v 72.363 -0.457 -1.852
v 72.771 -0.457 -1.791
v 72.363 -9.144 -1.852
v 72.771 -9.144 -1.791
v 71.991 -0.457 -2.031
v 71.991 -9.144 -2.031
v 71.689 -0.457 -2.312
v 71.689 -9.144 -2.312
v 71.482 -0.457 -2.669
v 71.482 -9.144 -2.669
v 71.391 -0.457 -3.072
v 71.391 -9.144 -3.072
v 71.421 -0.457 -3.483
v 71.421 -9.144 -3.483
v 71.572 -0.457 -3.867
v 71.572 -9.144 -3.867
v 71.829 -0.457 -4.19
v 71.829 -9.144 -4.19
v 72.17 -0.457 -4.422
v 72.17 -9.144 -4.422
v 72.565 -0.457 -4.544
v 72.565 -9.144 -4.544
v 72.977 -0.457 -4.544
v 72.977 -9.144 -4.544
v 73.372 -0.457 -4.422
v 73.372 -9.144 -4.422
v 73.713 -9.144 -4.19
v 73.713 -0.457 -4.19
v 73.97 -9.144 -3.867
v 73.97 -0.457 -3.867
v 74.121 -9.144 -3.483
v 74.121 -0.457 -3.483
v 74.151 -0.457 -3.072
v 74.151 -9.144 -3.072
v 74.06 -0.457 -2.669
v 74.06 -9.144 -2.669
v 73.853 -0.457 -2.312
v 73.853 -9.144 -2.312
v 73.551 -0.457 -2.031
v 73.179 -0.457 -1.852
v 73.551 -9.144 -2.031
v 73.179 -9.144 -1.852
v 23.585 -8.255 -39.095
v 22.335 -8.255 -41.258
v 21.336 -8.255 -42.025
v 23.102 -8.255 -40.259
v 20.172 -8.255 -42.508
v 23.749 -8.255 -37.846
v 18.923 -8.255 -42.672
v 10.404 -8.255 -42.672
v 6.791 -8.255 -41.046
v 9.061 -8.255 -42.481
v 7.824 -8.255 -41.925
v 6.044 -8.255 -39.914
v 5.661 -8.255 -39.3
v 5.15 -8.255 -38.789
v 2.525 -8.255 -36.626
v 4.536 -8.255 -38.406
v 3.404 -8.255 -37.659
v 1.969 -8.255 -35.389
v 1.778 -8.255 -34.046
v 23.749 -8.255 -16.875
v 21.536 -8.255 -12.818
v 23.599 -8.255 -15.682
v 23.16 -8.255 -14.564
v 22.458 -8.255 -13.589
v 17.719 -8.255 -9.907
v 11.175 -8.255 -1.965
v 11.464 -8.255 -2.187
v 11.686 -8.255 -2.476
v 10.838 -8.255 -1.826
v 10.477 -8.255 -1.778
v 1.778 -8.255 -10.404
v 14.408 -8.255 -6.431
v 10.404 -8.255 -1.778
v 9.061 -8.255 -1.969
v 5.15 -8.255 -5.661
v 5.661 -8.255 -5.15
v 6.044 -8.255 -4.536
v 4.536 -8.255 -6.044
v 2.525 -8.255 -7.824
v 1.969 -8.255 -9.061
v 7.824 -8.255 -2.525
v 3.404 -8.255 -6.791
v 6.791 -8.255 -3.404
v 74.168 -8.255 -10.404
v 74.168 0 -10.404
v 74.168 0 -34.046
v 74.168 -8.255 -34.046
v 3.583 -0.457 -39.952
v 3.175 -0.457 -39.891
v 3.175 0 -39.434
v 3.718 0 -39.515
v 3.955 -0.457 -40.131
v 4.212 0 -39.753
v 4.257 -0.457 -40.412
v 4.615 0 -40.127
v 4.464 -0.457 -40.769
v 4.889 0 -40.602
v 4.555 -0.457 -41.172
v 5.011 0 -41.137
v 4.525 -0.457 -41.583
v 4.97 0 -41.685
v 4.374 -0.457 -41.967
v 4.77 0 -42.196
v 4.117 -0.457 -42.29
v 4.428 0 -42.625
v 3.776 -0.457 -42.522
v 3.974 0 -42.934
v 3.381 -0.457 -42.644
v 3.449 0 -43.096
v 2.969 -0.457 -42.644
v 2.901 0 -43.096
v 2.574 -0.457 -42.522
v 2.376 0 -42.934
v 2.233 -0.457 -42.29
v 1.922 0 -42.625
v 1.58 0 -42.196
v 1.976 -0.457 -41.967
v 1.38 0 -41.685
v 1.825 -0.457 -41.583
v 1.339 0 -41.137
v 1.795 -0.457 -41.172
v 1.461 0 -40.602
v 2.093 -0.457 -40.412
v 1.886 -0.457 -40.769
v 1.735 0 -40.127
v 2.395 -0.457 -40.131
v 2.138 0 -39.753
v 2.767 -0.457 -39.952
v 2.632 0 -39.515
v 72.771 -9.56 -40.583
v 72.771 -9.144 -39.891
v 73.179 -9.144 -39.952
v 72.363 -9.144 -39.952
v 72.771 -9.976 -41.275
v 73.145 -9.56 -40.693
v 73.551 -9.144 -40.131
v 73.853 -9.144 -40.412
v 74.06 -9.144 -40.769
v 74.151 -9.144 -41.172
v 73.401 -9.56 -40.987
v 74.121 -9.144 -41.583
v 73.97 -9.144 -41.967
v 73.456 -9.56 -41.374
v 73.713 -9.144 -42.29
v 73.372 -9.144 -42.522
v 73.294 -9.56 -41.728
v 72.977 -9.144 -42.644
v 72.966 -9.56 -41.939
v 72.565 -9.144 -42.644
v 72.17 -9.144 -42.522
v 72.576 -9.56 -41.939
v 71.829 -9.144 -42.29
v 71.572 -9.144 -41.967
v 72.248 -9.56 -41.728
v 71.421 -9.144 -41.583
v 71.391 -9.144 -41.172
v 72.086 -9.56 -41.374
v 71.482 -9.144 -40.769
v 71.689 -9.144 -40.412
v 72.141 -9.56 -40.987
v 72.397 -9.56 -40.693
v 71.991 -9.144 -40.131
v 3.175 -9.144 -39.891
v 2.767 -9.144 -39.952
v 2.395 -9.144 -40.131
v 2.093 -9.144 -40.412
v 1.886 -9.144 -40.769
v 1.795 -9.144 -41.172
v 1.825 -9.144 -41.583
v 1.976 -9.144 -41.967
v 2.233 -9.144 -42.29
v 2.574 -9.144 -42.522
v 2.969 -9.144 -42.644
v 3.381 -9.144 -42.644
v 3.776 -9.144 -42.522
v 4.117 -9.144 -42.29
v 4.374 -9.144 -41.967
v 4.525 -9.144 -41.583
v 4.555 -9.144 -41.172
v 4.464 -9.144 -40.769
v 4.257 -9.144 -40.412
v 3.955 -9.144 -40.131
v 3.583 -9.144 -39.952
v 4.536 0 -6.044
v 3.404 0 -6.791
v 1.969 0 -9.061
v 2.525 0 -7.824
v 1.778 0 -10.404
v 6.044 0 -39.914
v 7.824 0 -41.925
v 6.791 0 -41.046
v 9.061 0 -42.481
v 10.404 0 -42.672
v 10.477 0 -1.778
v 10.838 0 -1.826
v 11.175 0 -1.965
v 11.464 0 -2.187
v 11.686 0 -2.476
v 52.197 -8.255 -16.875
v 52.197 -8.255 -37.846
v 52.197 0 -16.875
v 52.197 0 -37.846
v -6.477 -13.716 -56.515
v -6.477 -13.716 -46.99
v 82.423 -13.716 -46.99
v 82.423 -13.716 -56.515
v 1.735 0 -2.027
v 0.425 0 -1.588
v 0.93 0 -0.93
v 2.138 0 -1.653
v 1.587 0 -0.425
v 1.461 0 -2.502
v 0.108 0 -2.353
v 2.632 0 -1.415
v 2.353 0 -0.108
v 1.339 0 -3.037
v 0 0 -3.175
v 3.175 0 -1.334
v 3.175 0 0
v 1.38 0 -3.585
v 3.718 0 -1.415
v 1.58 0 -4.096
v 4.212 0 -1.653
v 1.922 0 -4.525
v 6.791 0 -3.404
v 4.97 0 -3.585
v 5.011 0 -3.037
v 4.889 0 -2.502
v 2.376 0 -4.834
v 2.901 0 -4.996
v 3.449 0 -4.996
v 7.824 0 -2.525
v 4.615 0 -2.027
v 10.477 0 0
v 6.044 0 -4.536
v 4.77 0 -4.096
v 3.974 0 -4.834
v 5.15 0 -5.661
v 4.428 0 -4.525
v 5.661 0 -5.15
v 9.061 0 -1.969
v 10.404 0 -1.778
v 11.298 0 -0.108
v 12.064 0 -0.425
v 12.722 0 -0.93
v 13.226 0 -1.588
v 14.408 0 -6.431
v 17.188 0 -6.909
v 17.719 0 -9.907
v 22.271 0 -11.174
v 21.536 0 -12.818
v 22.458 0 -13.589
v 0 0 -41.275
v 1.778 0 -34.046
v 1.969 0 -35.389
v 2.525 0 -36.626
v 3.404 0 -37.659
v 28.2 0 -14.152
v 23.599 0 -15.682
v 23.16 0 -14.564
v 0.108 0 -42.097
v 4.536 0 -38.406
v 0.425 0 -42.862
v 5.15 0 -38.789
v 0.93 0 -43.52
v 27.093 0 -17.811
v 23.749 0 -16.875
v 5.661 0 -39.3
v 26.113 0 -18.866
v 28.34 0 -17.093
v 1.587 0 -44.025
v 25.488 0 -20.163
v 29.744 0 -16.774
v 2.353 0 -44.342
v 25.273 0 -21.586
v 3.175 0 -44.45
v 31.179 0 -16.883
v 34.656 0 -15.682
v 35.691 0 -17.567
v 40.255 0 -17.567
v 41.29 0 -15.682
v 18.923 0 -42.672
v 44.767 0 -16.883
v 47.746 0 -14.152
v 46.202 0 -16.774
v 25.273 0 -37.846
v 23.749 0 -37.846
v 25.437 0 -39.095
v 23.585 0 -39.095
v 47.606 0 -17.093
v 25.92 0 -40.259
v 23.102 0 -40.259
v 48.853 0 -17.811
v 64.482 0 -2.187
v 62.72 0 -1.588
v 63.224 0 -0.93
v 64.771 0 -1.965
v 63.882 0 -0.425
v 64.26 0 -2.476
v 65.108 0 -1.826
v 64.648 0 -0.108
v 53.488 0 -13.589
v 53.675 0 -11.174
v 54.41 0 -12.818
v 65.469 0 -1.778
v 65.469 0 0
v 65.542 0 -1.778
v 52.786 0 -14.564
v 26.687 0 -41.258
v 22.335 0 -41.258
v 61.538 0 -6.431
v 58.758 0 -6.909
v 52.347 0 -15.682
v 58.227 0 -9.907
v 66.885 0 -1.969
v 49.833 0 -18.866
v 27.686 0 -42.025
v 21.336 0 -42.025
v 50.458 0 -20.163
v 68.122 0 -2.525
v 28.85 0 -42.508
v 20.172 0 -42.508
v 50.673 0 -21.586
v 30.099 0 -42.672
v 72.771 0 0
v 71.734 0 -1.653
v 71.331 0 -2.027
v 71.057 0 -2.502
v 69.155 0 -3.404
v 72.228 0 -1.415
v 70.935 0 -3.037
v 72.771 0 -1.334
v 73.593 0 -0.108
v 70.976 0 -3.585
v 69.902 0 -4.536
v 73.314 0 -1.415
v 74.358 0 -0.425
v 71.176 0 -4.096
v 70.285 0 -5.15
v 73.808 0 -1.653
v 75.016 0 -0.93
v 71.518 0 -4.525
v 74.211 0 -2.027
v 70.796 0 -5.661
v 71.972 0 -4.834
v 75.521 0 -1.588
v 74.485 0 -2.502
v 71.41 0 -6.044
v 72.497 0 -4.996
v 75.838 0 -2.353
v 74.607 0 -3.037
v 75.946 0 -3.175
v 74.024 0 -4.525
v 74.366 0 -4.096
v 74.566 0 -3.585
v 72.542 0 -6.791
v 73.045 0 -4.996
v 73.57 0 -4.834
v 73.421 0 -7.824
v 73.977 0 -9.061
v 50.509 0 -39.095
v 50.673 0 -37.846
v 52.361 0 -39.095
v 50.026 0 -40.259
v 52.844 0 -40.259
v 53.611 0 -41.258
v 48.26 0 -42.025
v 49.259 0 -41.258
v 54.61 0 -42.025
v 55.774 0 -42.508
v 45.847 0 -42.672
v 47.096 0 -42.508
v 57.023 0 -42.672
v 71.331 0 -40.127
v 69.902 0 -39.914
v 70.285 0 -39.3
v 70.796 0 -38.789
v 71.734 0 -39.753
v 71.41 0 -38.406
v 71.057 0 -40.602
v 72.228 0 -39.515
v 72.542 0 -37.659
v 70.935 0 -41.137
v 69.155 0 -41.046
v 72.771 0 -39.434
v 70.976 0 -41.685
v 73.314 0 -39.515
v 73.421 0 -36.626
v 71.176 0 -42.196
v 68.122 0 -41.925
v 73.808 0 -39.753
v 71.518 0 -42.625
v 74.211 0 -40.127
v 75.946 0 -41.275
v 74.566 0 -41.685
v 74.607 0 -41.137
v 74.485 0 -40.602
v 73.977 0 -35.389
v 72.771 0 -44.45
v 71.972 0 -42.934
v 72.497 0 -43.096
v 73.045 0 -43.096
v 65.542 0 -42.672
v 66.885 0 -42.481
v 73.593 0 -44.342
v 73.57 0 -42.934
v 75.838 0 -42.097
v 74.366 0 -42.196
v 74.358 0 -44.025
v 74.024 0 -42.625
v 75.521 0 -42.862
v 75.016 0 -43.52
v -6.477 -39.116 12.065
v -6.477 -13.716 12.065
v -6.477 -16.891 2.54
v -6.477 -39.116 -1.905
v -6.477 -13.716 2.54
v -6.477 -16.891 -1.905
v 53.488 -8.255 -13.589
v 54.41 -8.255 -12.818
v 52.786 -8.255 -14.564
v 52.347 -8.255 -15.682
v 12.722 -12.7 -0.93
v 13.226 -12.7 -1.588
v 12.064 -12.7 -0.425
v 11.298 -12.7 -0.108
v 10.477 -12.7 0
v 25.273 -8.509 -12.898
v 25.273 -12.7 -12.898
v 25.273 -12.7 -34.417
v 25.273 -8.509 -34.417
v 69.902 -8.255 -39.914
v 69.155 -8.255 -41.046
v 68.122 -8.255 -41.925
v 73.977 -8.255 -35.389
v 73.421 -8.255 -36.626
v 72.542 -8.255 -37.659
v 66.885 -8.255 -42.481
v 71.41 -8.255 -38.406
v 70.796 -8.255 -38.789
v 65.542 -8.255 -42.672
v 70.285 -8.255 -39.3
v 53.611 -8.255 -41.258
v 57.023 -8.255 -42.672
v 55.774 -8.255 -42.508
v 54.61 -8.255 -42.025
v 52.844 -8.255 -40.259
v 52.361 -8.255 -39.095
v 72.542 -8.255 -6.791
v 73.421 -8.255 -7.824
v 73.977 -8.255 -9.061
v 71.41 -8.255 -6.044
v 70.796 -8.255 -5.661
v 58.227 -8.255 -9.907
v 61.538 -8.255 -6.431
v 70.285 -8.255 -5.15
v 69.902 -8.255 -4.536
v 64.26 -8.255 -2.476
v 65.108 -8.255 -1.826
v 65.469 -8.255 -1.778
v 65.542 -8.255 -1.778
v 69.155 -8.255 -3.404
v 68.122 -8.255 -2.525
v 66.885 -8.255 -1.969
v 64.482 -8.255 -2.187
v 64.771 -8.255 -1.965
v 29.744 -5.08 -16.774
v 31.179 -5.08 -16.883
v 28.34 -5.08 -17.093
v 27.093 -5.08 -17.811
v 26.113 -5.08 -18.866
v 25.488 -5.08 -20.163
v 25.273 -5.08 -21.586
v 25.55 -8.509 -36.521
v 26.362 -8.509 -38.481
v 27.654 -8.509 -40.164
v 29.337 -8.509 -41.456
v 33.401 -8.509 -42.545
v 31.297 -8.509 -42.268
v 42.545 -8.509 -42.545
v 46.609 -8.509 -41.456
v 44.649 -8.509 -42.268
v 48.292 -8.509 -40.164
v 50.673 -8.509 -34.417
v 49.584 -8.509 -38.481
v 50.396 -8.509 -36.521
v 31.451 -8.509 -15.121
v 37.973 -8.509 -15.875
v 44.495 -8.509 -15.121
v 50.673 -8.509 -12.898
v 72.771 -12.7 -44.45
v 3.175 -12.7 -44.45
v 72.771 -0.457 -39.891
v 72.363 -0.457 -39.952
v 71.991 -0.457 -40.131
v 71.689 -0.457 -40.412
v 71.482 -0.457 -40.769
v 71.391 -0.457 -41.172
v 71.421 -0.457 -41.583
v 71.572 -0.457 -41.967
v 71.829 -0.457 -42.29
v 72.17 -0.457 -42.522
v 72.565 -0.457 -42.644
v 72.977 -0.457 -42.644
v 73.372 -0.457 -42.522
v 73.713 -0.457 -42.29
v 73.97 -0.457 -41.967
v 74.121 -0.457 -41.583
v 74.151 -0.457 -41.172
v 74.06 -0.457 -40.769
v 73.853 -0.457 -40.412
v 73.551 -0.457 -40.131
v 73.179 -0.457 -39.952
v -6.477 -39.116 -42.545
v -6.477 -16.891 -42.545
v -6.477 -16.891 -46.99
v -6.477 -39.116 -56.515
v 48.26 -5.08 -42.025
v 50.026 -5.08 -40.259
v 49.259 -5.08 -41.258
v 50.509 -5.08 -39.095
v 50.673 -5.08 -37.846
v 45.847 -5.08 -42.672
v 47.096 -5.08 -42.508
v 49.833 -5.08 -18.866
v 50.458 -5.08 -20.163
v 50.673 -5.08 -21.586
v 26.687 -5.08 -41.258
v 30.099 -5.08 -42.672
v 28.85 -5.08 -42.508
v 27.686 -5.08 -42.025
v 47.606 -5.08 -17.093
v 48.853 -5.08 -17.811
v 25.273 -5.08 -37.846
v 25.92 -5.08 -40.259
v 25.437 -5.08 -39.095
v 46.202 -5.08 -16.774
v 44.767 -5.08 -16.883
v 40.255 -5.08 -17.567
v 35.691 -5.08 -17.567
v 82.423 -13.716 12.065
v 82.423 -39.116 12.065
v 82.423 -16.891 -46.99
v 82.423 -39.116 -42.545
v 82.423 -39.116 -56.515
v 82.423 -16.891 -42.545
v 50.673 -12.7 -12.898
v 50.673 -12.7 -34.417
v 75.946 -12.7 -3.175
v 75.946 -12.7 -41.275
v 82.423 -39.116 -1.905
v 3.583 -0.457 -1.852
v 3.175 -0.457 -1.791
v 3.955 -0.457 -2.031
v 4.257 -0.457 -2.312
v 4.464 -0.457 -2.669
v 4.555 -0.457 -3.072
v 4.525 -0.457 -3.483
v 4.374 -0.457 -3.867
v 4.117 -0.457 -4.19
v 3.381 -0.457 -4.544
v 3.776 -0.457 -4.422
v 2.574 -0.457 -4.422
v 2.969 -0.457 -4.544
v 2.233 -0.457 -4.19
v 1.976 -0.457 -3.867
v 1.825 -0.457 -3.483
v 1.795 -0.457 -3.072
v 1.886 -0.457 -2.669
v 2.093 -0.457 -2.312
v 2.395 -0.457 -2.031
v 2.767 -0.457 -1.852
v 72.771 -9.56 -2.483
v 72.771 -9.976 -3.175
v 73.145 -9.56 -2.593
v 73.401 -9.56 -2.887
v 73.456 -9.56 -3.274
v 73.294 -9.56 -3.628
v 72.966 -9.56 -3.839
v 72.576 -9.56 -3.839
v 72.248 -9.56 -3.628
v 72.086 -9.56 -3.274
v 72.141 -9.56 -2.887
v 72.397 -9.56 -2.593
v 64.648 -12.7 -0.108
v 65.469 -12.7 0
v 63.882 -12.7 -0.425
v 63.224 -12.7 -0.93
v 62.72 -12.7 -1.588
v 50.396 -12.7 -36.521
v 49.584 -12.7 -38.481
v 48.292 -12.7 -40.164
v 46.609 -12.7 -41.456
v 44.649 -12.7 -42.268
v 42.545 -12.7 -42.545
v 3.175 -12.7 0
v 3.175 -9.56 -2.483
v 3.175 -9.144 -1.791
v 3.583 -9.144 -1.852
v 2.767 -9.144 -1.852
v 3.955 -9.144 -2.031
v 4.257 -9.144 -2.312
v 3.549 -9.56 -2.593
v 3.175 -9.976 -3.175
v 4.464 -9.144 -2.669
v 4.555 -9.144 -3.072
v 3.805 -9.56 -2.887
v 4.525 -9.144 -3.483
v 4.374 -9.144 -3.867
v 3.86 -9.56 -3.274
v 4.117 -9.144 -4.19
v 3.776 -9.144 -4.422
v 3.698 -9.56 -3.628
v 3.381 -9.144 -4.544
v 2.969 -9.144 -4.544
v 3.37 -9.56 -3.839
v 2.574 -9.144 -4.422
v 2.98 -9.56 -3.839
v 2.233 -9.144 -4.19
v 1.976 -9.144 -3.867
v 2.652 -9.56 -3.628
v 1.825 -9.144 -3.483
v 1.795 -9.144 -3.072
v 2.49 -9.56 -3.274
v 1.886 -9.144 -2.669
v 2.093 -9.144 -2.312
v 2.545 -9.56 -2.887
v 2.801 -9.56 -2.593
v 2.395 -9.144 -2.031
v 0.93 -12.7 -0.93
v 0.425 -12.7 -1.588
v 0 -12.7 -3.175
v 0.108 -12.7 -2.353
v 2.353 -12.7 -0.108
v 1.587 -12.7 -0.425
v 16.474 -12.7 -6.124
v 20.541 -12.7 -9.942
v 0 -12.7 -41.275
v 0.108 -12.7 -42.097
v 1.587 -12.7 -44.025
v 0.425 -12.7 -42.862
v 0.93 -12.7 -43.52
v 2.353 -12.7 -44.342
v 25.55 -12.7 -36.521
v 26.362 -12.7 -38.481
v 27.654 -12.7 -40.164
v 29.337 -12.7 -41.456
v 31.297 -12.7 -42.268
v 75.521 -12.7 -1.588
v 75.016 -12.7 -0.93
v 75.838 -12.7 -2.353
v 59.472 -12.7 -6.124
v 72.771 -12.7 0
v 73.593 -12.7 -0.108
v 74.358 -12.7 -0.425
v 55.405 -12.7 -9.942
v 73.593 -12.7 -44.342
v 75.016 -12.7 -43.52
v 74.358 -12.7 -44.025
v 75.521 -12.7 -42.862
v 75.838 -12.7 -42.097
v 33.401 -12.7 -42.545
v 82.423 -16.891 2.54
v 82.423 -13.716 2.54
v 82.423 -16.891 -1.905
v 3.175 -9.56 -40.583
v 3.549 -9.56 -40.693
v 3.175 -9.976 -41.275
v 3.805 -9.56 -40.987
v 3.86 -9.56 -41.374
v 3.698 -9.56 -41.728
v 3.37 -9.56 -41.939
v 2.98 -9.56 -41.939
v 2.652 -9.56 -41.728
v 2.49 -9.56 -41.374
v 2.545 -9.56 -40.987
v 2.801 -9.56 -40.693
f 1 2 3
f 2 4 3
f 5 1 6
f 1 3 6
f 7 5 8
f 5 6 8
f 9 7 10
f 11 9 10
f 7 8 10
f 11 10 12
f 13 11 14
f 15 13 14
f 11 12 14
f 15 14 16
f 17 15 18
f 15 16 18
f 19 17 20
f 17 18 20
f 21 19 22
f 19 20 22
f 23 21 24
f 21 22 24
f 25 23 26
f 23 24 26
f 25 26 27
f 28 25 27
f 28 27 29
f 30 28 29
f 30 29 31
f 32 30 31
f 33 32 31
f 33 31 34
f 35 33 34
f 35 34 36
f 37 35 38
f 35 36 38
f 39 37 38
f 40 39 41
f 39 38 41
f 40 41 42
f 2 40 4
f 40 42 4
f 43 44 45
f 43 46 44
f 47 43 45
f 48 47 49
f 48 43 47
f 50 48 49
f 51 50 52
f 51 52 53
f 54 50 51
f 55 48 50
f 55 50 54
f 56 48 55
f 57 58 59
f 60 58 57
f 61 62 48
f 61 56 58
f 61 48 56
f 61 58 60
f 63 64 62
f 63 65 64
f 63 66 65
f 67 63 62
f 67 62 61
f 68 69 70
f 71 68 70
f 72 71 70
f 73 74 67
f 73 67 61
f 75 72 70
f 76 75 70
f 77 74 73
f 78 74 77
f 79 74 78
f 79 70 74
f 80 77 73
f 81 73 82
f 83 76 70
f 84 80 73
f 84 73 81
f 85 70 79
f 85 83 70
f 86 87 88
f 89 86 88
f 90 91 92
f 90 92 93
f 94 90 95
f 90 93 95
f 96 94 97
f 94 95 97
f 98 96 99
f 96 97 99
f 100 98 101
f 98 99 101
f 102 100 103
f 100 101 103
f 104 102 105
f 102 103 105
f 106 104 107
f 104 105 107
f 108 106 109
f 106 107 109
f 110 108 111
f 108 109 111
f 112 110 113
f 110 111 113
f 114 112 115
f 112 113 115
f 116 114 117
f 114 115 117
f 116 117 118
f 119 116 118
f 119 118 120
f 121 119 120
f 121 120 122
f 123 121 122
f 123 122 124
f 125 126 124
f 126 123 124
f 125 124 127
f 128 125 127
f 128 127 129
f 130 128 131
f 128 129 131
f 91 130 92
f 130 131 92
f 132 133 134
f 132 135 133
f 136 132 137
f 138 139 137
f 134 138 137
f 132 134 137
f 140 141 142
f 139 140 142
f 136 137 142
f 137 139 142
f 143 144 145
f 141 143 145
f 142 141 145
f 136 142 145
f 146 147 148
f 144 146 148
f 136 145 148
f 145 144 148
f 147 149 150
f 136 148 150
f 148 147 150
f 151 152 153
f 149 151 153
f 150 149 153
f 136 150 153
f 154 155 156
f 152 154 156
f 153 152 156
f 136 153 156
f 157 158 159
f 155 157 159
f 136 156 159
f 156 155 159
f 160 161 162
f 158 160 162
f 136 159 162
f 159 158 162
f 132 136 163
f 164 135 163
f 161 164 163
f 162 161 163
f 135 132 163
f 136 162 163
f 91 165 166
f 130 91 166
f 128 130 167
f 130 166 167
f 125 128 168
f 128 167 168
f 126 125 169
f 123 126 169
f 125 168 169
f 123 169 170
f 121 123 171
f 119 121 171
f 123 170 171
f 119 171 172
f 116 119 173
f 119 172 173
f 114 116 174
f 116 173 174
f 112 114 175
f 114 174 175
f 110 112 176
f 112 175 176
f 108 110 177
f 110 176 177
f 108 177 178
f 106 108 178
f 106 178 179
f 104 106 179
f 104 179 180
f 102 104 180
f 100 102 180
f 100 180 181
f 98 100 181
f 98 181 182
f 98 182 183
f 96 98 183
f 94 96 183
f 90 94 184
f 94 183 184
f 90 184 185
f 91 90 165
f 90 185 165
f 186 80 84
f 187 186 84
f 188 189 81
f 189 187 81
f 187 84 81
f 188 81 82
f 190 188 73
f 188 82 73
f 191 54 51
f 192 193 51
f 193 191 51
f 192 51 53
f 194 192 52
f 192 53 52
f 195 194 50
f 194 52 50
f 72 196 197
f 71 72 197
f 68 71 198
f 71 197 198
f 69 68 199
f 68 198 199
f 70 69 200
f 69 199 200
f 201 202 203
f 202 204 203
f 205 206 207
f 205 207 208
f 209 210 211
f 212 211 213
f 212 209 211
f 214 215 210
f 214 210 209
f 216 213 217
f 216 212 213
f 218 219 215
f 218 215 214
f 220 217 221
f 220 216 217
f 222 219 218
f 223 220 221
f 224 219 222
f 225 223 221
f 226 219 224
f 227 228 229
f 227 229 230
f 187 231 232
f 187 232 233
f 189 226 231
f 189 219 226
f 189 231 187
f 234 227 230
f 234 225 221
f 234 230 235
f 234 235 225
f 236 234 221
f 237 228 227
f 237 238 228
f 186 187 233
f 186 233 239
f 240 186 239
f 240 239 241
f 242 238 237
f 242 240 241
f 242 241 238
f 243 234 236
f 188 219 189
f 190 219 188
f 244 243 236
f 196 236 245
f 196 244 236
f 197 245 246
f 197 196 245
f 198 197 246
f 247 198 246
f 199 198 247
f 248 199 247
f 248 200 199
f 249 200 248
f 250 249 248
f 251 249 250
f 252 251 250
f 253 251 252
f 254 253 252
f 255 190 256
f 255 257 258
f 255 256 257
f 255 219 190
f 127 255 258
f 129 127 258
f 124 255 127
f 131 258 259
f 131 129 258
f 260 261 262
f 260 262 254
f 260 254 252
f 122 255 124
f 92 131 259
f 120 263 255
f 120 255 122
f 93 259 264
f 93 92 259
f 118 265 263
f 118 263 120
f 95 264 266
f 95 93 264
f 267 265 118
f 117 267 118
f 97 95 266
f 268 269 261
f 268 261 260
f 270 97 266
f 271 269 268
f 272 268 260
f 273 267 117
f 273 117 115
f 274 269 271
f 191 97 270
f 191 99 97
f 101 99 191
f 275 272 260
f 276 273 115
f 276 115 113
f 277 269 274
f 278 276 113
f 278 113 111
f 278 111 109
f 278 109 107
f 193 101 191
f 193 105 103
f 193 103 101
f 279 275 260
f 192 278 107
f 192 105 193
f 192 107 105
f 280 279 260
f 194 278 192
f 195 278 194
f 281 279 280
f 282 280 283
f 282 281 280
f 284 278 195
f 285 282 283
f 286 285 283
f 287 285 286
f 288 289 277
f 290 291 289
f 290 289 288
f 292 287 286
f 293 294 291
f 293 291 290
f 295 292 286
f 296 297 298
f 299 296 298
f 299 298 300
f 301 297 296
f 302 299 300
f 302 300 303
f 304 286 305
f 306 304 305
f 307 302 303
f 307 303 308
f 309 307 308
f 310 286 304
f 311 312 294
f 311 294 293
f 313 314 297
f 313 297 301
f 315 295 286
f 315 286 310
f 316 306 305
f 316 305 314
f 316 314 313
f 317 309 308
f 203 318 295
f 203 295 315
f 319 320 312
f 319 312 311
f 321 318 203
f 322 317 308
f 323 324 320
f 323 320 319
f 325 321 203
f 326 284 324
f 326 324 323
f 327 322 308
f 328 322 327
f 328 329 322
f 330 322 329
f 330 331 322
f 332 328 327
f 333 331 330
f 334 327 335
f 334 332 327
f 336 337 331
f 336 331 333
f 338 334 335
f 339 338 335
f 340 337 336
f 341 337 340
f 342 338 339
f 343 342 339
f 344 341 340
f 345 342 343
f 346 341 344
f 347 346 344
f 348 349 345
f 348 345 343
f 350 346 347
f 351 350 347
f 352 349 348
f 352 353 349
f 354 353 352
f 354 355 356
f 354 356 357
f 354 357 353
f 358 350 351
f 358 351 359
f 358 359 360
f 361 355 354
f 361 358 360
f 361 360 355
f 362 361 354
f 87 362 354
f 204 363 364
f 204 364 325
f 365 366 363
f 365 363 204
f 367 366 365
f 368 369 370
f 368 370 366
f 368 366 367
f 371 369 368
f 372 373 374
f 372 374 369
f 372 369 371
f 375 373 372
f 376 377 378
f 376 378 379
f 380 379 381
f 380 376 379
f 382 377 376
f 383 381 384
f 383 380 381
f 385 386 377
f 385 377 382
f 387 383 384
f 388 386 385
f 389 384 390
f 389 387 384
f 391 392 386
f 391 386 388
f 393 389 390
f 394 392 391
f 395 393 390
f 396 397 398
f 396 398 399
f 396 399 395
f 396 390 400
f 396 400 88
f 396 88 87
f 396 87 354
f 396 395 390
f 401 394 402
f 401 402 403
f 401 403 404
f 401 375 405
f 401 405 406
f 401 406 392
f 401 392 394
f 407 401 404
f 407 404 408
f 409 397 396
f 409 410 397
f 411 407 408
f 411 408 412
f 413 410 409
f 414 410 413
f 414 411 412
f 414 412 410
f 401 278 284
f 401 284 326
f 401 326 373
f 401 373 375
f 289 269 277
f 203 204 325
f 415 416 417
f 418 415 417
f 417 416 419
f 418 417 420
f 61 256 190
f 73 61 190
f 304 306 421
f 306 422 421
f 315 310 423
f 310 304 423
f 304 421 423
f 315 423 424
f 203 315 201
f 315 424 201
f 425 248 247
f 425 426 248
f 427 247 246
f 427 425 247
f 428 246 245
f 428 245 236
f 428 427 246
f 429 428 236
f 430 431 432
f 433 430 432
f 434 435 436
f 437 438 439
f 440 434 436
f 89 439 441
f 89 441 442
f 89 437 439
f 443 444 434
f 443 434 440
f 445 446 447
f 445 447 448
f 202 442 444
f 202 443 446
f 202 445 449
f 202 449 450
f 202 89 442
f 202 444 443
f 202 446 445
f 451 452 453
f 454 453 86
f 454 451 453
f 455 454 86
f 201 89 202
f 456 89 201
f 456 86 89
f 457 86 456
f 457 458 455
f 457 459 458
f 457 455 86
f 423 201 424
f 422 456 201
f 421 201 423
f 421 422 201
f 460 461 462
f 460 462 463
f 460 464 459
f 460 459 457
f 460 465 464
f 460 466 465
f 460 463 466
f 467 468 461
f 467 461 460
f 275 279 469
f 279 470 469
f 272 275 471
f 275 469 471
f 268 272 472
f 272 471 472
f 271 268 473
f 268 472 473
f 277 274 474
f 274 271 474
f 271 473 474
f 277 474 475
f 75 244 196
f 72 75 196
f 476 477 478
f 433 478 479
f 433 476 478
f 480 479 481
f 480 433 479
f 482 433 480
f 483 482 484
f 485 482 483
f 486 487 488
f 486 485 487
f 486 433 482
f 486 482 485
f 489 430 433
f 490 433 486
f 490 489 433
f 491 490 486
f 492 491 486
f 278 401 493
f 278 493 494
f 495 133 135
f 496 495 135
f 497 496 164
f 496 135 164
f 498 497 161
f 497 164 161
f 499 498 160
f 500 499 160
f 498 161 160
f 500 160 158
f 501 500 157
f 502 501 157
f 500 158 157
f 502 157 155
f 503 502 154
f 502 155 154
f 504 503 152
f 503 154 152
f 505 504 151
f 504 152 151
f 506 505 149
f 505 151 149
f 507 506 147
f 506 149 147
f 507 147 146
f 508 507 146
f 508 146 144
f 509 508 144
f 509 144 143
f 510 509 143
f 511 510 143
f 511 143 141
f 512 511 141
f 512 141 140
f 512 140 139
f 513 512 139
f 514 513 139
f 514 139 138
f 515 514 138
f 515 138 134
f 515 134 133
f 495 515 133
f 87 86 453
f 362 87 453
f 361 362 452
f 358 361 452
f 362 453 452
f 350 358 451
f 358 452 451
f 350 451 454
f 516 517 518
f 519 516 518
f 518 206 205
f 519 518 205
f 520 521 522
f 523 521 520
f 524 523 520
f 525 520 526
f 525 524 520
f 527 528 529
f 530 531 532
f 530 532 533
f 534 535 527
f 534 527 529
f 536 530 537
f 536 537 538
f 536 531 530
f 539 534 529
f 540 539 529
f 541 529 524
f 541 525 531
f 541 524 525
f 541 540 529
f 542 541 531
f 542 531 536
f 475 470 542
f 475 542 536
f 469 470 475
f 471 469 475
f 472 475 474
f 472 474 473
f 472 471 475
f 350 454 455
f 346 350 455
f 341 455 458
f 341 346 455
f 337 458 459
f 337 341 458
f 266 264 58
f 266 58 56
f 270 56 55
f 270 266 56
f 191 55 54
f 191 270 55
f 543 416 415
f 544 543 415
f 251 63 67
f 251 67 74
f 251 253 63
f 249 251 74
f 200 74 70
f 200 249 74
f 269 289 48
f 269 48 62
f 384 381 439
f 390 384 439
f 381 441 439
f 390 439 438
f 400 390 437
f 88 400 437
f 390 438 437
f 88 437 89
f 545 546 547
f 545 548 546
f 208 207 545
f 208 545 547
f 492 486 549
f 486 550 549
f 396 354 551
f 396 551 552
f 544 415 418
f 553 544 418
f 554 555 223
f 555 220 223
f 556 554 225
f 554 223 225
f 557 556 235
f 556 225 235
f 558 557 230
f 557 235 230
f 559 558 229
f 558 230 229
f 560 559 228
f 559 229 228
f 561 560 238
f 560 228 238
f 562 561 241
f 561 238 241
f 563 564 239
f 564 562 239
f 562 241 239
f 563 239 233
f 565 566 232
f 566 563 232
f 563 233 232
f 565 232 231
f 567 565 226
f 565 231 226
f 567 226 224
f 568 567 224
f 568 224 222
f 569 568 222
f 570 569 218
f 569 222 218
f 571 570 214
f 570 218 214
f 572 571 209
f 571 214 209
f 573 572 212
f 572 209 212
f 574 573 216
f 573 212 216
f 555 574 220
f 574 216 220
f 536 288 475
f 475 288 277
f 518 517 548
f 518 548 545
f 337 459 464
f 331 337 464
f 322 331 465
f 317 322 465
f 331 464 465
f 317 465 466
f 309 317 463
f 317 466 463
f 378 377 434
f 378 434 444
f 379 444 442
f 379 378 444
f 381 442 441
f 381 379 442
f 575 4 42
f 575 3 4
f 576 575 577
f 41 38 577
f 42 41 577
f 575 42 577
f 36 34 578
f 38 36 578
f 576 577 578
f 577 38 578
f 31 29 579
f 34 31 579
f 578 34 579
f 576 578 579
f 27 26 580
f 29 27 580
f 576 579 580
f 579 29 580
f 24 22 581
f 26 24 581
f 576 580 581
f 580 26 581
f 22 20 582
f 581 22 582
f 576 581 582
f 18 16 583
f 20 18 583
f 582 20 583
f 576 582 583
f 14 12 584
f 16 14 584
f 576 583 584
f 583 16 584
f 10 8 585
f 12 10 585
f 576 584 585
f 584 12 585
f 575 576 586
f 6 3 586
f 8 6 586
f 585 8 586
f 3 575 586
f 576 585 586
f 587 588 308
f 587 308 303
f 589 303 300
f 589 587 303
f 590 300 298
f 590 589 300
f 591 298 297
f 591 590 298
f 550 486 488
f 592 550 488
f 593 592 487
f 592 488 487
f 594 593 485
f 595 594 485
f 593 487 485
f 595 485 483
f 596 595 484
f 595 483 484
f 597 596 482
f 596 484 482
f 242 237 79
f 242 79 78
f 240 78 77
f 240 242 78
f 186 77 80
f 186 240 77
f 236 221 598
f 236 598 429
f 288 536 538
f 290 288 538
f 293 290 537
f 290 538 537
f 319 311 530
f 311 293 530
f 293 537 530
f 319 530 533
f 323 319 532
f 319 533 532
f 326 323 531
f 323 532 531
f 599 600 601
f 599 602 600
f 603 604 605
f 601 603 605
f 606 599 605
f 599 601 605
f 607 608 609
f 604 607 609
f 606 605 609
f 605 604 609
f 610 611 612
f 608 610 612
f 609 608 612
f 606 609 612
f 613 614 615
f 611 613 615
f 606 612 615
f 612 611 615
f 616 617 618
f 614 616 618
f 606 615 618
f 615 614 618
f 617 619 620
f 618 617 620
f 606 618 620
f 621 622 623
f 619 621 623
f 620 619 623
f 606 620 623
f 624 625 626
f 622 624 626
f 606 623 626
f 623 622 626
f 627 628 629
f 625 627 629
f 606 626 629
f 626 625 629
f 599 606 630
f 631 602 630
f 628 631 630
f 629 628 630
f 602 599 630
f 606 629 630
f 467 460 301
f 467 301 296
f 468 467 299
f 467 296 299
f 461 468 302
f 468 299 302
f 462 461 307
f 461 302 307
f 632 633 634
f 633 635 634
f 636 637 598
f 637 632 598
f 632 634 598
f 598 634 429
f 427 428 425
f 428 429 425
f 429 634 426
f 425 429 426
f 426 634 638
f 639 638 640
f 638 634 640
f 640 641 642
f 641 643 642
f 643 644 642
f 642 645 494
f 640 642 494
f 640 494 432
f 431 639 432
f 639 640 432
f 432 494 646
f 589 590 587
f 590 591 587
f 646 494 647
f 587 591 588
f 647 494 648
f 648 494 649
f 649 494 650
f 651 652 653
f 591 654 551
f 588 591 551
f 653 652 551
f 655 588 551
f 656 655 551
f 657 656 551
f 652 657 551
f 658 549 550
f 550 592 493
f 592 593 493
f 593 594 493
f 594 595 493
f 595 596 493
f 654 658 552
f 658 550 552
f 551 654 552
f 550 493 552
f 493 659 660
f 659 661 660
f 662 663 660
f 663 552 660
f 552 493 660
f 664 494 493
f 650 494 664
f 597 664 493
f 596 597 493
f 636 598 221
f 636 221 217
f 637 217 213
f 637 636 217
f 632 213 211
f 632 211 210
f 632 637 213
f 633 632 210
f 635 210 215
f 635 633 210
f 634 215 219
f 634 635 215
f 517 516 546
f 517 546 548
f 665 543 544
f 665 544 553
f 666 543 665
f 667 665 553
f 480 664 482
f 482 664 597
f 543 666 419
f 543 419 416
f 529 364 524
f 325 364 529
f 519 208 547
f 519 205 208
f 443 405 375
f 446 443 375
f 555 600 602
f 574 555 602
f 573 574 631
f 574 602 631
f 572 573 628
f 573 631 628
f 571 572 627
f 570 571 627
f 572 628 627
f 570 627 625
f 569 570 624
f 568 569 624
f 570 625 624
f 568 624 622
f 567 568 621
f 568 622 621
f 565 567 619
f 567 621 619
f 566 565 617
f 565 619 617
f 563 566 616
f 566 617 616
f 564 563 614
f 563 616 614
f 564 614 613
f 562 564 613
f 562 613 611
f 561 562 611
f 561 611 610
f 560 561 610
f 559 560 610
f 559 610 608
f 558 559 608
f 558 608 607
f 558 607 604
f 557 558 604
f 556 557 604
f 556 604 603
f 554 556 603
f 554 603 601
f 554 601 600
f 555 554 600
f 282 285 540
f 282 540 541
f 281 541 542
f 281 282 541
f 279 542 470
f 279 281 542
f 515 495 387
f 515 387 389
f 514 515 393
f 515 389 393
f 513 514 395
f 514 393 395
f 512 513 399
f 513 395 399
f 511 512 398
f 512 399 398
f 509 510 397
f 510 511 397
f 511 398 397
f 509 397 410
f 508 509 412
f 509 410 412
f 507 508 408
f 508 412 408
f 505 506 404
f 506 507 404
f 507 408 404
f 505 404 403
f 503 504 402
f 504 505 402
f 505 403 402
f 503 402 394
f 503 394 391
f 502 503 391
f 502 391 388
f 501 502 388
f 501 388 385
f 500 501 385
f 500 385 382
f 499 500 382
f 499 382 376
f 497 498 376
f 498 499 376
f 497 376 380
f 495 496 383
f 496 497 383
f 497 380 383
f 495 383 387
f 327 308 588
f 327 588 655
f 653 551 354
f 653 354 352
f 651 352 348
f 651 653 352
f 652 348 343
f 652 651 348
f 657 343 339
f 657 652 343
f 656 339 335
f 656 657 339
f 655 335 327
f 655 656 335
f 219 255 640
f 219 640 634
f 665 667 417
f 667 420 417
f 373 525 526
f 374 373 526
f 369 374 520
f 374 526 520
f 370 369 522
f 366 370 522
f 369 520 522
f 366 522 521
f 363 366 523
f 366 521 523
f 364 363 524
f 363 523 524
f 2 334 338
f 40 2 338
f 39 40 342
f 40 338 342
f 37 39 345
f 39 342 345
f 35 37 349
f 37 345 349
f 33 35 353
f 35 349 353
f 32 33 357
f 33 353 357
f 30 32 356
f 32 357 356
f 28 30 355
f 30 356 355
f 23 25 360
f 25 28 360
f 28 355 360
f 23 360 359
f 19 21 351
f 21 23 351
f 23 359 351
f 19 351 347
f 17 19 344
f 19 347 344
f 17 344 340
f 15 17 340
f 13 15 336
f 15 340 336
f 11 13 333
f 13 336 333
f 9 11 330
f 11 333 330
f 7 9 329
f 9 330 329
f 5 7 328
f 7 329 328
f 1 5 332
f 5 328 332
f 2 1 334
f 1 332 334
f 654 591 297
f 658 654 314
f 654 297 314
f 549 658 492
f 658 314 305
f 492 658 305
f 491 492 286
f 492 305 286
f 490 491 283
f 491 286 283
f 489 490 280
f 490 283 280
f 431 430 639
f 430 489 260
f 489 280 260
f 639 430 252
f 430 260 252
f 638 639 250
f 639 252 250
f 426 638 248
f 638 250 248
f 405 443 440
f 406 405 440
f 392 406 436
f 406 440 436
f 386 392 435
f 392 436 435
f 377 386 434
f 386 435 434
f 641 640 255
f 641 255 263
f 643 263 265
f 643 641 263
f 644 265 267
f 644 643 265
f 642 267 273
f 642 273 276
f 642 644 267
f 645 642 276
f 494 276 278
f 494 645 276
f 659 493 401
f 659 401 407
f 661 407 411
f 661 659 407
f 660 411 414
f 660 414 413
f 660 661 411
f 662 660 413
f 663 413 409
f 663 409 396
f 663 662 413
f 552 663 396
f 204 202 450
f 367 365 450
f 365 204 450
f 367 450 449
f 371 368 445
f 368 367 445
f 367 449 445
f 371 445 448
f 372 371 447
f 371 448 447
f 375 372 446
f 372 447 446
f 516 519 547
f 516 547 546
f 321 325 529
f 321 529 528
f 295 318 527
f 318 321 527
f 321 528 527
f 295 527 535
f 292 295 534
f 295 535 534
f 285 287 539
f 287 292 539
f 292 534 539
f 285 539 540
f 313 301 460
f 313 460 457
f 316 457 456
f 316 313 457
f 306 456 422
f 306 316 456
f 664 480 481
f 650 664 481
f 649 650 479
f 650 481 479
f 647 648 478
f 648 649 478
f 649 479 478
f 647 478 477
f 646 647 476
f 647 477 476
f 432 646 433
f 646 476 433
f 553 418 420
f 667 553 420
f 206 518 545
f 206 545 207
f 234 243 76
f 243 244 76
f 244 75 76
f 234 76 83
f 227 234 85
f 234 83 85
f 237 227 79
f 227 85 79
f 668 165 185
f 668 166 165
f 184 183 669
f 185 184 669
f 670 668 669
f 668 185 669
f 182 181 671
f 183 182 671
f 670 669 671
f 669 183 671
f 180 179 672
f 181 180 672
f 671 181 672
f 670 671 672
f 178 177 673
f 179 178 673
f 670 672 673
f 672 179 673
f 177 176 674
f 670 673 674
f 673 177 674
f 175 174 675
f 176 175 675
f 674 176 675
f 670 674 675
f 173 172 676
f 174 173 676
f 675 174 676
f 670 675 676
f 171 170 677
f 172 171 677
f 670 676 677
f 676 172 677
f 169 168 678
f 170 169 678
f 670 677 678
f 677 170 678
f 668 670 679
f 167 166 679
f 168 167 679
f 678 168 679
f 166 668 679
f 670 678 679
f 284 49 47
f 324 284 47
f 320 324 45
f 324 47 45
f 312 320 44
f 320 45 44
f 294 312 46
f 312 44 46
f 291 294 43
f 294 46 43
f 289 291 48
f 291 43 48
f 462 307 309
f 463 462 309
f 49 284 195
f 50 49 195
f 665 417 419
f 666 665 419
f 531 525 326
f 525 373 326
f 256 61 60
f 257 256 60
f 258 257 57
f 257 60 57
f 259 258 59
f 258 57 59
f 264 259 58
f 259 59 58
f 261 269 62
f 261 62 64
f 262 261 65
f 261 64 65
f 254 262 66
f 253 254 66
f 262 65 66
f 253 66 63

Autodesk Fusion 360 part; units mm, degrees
sketch "Sketch1" plane through (0, 0, 0) normal (0, 1, 0) x (1, 0, 0)
  line L0 (75.946, 0) -> (75.946, 44.45)
  line L1 (75.946, 44.45) -> (0, 44.45)
  line L2 (0, 44.45) -> (0, 0)
  arc A0 (63.5707, 0) -> (12.3753, 0) centre (37.973, -12.7) ccw
  line L3 (0, 0) -> (12.3753, 0)
  line L4 (63.5707, 0) -> (75.946, 0)
  dimension "d1" = 75.946
  dimension "d2" = 44.45
  dimension "d3" = 12.7
  dimension "d4" = 28.575
  dimension "d5" = 37.973
extrude "Extrude1" add sketch "Sketch1" against normal blind 12.7 makes body 1
fillet "Fillet1" radius 3.175 6 edges at (0, -6.35, 0) (12.3753, -6.35, 0) (63.5707, -6.35, 0) (75.946, -6.35, 0) (75.946, -6.35, -44.45) (0, -6.35, -44.45) on bodies 1
sketch "Sketch2" plane through (0, 0, 0) normal (0, 1, 0) x (-1, 0, 0)
  arc A0 (-3.175, -44.45) -> (0, -41.275) centre (-3.175, -41.275) ccw
  line L0 (0, -41.275) -> (0, -3.175)
  arc A1 (0, -3.175) -> (-3.175, 0) centre (-3.175, -3.175) ccw
  line L1 (-3.175, 0) -> (-10.4767, 0)
  arc A2 (-10.4767, 0) -> (-13.2263, -1.5875) centre (-10.4767, -3.175) ccw
  arc A3 (-62.7197, -1.5875) -> (-13.2263, -1.5875) centre (-37.973, 12.7) ccw
  arc A4 (-62.7197, -1.5875) -> (-65.4693, 0) centre (-65.4693, -3.175) ccw
  line L2 (-65.4693, 0) -> (-72.771, 0)
  arc A5 (-72.771, 0) -> (-75.946, -3.175) centre (-72.771, -3.175) ccw
  line L3 (-75.946, -3.175) -> (-75.946, -41.275)
  arc A6 (-75.946, -41.275) -> (-72.771, -44.45) centre (-72.771, -41.275) ccw
  line L4 (-72.771, -44.45) -> (-3.175, -44.45)
  line L5 (-1.778, -41.275) -> (-1.778, -3.175)
  arc A7 (-1.778, -3.175) -> (-3.175, -1.778) centre (-3.175, -3.175) ccw
  line L6 (-3.175, -1.778) -> (-10.4767, -1.778)
  arc A8 (-10.4767, -1.778) -> (-11.6865, -2.4765) centre (-10.4767, -3.175) ccw
  arc A9 (-64.2595, -2.4765) -> (-11.6865, -2.4765) centre (-37.973, 12.7) ccw
  arc A10 (-64.2595, -2.4765) -> (-65.4693, -1.778) centre (-65.4693, -3.175) ccw
  line L7 (-65.4693, -1.778) -> (-72.771, -1.778)
  arc A11 (-72.771, -1.778) -> (-74.168, -3.175) centre (-72.771, -3.175) ccw
  line L8 (-74.168, -3.175) -> (-74.168, -41.275)
  arc A12 (-74.168, -41.275) -> (-72.771, -42.672) centre (-72.771, -41.275) ccw
  line L9 (-72.771, -42.672) -> (-3.175, -42.672)
  arc A13 (-3.175, -42.672) -> (-1.778, -41.275) centre (-3.175, -41.275) ccw
  line L10 (-37.973, -44.45) -> (-37.973, -6.9842) construction
  line L11 (-25.273, -47.7039) -> (-25.273, -6.2054)
  line L12 (-23.749, -47.7039) -> (-23.749, -6.2054)
  line L13 (-50.673, -47.7039) -> (-50.673, -6.2054)
  line L14 (-52.197, -47.7039) -> (-52.197, -6.2054)
  arc A14 (0, -41.275) -> (-3.175, -44.45) centre (-3.175, -41.275) ccw
  arc A15 (-72.771, -44.45) -> (-75.946, -41.275) centre (-72.771, -41.275) ccw
  arc A16 (-75.946, -3.175) -> (-72.771, 0) centre (-72.771, -3.175) ccw
  arc A17 (-3.175, 0) -> (0, -3.175) centre (-3.175, -3.175) ccw
  dimension "d9" = -1.778
  dimension "d10" = 1.524
  dimension "d11" = 12.7
extrude "Extrude2" cut sketch "Sketch2" against normal blind 8.255 contours L5 L6 A8 A9 L9 L12 A14 A17 | A9 A10 L7 L8 L9 L14 A15 A16 bodies 1
extrude "Extrude3" cut sketch "Sketch2" against normal blind 5.08 contours A9 L9 L11 L13 bodies 1
fillet "Fillet2" radius 4.826 16 edges at (6.0261, -4.1275, -42.672) (1.778, -4.1275, -38.4239) (1.778, -4.1275, -6.0261) (6.0261, -4.1275, -1.778) (23.749, -4.1275, -14.1138) (23.749, -4.1275, -42.672) (50.673, -2.54, -42.672) (69.9199, -4.1275, -42.672) (74.168, -4.1275, -38.4239) (25.273, -2.54, -42.672) (25.273, -2.54, -14.8684) (50.673, -2.54, -14.8684) (69.9199, -4.1275, -1.778) (74.168, -4.1275, -6.0261) (52.197, -4.1275, -42.672) (52.197, -4.1275, -14.1138) on bodies 1
hole "Hole1" at (3.175, 0, -41.275) at (3.175, 0, -3.175) at (72.771, 0, -3.175) at (72.771, 0, -41.275) direction (0, -1, 0) diameter 2.7686 depth 9.144 tip angle 118 countersink diameter 3.683 countersink angle 90 bodies 1
sketch "Sketch3" plane through (0, -12.7, 0) normal (0, -1, 0) x (1, 0, 0)
  arc A0 (0, -41.275) -> (3.175, -44.45) centre (3.175, -41.275) ccw
  line L0 (3.175, -44.45) -> (72.771, -44.45)
  arc A1 (72.771, -44.45) -> (75.946, -41.275) centre (72.771, -41.275) ccw
  line L1 (75.946, -41.275) -> (75.946, -3.175)
  arc A2 (75.946, -3.175) -> (72.771, 0) centre (72.771, -3.175) ccw
  line L2 (72.771, 0) -> (65.4693, 0)
  arc A3 (65.4693, 0) -> (62.7197, -1.5875) centre (65.4693, -3.175) ccw
  arc A4 (13.2263, -1.5875) -> (62.7197, -1.5875) centre (37.973, 12.7) ccw
  arc A5 (13.2263, -1.5875) -> (10.4767, 0) centre (10.4767, -3.175) ccw
  line L3 (10.4767, 0) -> (3.175, 0)
  arc A6 (3.175, 0) -> (0, -3.175) centre (3.175, -3.175) ccw
  line L4 (0, -3.175) -> (0, -41.275)
  line L5 (37.973, -44.45) -> (37.973, -7.62)
  line L6 (50.673, -9.525) -> (25.273, -9.525)
  line L7 (25.273, -9.525) -> (25.273, -42.545)
  line L8 (25.273, -42.545) -> (50.673, -42.545)
  line L9 (50.673, -42.545) -> (50.673, -9.525)
  line L10 (50.673, -9.525) -> (25.273, -42.545) construction
  line L11 (25.273, -9.525) -> (50.673, -42.545) construction
  point P0 (37.973, -26.035)
  dimension "d24" = 33.02
  dimension "d25" = 25.4
extrude "Extrude4" cut sketch "Sketch3" against normal blind 4.191 contours A4 L5 L7 L8 | A4 L5 L8 L9 bodies 1
fillet "Fillet3" radius 8.128 2 edges at (50.673, -10.6045, -42.545) (25.273, -10.6045, -42.545) on bodies 1
ref_plane "WorkPlane1" through (37.973, -6.35, -22.225) normal (1, 0, 0) x (0, 0, 1)
sketch "Sketch4" plane through (37.973, -6.35, -22.225) normal (1, 0, 0) x (0, 0, -1)
  line L0 (0, 0) -> (0, -17.7867)
  line L1 (-17.4102, -10.541) -> (14.5751, -10.541)
  line L2 (19.05, -6.35) -> (-19.05, -6.35)
  line L3 (20.32, -10.541) -> (34.29, -10.541)
  line L4 (34.29, -10.541) -> (34.29, -32.766)
  line L5 (34.29, -32.766) -> (20.32, -32.766)
  line L6 (20.32, -32.766) -> (20.32, -10.541)
  line L7 (34.29, -10.541) -> (24.765, -10.541)
  line L8 (24.765, -10.541) -> (24.765, -7.366)
  line L9 (24.765, -7.366) -> (34.29, -7.366)
  line L10 (34.29, -7.366) -> (34.29, -10.541)
  line L11 (-34.29, -10.541) -> (-24.765, -10.541)
  line L12 (-34.29, -7.366) -> (-34.29, -10.541)
  line L13 (-24.765, -7.366) -> (-34.29, -7.366)
  line L14 (-20.32, -32.766) -> (-20.32, -10.541)
  line L15 (-24.765, -10.541) -> (-24.765, -7.366)
  line L16 (-20.32, -10.541) -> (-34.29, -10.541)
  line L17 (-34.29, -32.766) -> (-20.32, -32.766)
  line L18 (-34.29, -10.541) -> (-34.29, -32.766)
  dimension "d29" = 4.191
  dimension "d30" = 22.225
  dimension "d31" = 13.97
  dimension "d32" = 3.175
  dimension "d33" = 9.525
  dimension "d34" = 20.32
extrude "Extrude5" add sketch "Sketch4" along normal mid plane 88.9 separate body makes body 2 at (23.1563, -22.1827, 12.065) makes body 3 at (52.7897, -30.6493, -56.515)
sketch "Sketch5" plane through (0, -5.08, 0) normal (0, 1, 0) x (-1, 0, 0)
  curve A0
  line L0 (-50.673, -21.5865) -> (-50.673, -37.846)
  arc A1 (-50.673, -37.846) -> (-45.847, -42.672) centre (-45.847, -37.846) ccw
  line L1 (-45.847, -42.672) -> (-30.099, -42.672)
  arc A2 (-30.099, -42.672) -> (-25.273, -37.846) centre (-30.099, -37.846) ccw
  line L2 (-25.273, -37.846) -> (-25.273, -21.5865)
  curve A3
  arc A4 (-44.7668, -16.8829) -> (-31.1792, -16.8829) centre (-37.973, 12.7) ccw
  line L3 (-30.48, -27.94) -> (-45.72, -27.94)
  arc A5 (-45.72, -27.94) -> (-45.72, -33.02) centre (-45.72, -30.48) ccw
  line L4 (-45.72, -33.02) -> (-30.48, -33.02)
  arc A6 (-30.48, -33.02) -> (-30.48, -27.94) centre (-30.48, -30.48) ccw
  line L5 (-30.48, -30.48) -> (-45.72, -30.48) construction
  dimension "d40" = 15.24
  dimension "d41" = 5.08
  dimension "d42" = 5.207
  dimension "d43" = 12.192
